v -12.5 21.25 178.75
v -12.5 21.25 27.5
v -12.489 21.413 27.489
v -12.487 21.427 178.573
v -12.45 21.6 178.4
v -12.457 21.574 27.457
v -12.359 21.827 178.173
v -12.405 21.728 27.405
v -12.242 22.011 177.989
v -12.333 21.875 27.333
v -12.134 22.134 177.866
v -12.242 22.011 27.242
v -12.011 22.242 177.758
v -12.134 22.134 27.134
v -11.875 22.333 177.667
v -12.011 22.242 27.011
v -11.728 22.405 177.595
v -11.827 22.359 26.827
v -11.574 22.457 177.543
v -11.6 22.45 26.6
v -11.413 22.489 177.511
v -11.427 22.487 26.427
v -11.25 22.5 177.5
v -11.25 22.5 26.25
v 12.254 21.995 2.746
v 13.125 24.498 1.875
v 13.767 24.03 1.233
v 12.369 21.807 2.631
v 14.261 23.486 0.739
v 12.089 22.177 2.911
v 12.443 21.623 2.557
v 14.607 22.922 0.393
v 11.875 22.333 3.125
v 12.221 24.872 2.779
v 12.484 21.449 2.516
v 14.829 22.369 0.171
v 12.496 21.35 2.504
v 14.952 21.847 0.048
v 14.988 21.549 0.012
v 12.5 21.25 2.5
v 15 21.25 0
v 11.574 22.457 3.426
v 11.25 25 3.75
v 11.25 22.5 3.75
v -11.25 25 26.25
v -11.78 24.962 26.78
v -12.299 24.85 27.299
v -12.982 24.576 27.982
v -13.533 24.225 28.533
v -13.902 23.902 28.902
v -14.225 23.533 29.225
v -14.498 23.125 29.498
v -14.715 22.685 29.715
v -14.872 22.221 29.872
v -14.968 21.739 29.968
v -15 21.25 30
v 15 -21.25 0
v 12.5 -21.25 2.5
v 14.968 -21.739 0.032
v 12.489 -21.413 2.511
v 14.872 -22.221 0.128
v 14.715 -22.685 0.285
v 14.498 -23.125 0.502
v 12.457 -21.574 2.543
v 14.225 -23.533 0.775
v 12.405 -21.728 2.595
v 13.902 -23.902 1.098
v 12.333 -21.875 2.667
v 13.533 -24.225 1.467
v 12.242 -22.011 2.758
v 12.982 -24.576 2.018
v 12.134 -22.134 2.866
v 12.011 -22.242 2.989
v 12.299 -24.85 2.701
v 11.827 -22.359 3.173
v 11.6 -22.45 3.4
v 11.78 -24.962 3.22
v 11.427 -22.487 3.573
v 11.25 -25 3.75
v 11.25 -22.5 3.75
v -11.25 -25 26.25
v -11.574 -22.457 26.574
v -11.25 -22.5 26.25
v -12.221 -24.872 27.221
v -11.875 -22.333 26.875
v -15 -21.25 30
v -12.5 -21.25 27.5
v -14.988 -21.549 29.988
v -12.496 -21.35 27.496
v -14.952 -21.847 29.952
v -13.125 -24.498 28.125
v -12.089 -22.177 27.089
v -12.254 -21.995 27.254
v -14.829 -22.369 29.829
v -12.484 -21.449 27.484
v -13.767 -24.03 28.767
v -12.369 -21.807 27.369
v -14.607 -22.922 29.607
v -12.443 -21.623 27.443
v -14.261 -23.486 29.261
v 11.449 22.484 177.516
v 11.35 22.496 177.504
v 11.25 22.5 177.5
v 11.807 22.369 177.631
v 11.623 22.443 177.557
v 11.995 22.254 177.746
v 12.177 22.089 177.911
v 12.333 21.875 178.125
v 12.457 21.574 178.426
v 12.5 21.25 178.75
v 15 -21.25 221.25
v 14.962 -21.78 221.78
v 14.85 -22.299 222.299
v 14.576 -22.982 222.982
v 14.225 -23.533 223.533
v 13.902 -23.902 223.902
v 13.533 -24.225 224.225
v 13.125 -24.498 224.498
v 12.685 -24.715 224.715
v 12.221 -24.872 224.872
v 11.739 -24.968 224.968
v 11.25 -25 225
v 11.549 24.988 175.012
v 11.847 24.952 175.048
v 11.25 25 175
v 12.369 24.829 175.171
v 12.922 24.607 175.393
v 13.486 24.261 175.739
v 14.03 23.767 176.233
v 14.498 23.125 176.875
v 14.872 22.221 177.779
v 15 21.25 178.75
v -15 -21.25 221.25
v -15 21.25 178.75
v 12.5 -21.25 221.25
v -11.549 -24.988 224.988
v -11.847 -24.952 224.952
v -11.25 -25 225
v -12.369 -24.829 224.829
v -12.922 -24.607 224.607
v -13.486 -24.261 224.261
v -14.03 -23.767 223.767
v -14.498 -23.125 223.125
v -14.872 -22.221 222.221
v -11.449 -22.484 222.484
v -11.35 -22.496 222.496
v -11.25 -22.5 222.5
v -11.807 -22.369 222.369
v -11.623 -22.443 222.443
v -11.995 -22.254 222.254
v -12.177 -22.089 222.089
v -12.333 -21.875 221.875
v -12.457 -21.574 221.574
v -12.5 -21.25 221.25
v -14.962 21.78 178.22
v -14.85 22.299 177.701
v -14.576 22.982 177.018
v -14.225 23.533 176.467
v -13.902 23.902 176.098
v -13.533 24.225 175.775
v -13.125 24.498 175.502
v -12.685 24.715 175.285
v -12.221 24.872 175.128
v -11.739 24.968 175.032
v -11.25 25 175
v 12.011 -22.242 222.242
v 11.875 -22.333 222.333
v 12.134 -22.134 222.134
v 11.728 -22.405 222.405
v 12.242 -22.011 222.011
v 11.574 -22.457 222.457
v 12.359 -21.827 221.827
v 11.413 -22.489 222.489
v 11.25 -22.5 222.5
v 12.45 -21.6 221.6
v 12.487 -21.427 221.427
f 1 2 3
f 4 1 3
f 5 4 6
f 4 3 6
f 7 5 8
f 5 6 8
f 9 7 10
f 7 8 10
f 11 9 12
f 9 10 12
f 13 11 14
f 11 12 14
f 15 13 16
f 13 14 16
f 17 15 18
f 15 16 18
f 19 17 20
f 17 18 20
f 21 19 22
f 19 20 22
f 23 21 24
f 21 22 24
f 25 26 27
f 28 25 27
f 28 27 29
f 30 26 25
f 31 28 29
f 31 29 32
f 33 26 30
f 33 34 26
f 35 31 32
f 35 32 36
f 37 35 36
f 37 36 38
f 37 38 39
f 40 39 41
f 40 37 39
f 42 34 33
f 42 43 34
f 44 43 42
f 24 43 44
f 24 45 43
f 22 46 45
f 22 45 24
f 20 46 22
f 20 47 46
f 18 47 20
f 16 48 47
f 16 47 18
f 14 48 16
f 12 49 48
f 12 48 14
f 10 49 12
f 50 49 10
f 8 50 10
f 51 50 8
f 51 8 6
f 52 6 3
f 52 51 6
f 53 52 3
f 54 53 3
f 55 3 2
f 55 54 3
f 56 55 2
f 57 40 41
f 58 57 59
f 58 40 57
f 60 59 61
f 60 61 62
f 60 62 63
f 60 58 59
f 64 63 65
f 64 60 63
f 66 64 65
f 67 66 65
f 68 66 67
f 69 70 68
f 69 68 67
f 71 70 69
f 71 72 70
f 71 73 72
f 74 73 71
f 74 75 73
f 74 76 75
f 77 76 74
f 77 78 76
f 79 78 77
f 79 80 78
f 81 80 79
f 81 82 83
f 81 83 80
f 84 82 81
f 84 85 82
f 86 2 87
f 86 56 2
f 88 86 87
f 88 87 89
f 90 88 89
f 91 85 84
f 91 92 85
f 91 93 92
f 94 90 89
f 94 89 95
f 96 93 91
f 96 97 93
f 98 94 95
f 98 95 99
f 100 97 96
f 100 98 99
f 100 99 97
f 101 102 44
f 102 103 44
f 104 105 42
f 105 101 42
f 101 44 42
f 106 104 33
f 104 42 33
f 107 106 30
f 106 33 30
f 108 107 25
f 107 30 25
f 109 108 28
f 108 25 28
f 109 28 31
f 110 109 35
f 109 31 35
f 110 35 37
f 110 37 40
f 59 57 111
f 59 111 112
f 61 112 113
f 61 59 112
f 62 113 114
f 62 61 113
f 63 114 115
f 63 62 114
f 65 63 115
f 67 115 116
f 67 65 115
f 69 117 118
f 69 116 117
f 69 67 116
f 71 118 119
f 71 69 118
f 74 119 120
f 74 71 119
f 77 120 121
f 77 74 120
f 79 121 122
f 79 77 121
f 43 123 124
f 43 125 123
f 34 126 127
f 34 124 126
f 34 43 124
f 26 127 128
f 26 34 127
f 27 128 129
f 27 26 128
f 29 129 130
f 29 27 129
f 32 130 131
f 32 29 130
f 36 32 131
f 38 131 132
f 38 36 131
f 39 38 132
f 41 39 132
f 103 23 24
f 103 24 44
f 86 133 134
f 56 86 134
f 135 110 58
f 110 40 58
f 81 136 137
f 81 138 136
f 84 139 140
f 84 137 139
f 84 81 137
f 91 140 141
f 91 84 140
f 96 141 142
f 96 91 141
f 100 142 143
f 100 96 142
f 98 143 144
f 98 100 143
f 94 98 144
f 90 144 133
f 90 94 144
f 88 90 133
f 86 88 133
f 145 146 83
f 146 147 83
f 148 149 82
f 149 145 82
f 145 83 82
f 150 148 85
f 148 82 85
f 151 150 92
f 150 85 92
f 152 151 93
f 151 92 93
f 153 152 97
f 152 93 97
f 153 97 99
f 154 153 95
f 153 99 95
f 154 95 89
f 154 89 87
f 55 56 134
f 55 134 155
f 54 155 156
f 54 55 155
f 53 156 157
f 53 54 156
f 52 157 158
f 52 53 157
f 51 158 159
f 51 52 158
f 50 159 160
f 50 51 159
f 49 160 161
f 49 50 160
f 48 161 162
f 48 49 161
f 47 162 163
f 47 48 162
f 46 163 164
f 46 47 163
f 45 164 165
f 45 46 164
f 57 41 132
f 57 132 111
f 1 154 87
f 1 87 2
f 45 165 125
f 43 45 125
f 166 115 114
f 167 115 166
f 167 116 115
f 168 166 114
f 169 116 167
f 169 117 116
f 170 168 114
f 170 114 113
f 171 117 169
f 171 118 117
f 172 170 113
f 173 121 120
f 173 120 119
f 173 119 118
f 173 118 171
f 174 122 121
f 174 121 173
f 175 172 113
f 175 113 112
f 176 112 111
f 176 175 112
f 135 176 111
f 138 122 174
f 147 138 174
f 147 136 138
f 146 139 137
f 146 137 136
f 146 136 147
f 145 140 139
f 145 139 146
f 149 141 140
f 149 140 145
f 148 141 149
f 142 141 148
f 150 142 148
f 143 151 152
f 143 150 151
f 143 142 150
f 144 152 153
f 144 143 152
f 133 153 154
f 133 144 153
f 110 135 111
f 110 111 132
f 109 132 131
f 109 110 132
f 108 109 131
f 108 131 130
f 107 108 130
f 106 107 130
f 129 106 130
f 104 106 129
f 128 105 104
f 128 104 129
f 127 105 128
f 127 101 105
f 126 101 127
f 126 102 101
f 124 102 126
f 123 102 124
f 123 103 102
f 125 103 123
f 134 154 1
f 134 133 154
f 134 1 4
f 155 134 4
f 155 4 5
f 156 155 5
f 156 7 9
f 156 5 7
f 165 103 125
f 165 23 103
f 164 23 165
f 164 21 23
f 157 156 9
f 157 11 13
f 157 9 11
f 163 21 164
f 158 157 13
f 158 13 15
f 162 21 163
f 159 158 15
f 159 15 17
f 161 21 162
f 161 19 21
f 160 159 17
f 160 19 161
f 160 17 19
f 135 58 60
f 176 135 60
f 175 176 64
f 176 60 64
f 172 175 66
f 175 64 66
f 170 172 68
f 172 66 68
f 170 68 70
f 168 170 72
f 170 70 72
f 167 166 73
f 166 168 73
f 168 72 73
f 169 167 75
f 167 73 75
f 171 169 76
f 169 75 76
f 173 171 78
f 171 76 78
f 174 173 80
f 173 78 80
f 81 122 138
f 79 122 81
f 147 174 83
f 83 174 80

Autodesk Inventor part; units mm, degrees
ref_plane "Plano inicial" through (0, 0, 0) normal (0, 0, 1) x (1, 0, 0)
ref_plane "Plano final" through (0, 0, 225) normal (0, 0, 1) x (1, 0, 0)
sketch "Esboço" plane through (0, 0, 0) normal (0, 0, 1) x (1, 0, 0)
  line L0 (-15, -21.25) -> (-15, 21.25)
  line L1 (-11.25, 25) -> (11.25, 25)
  line L2 (15, 21.25) -> (15, -21.25)
  line L3 (11.25, -25) -> (-11.25, -25)
  arc A0 (-15, -21.25) -> (-11.25, -25) centre (-11.25, -21.25) ccw
  arc A1 (-11.25, 25) -> (-15, 21.25) centre (-11.25, 21.25) ccw
  arc A2 (15, 21.25) -> (11.25, 25) centre (11.25, 21.25) ccw
  arc A3 (11.25, -25) -> (15, -21.25) centre (11.25, -21.25) ccw
  arc A4 (-11.25, 22.5) -> (-12.5, 21.25) centre (-11.25, 21.25) ccw
  line L4 (-11.25, 22.5) -> (11.25, 22.5)
  arc A5 (12.5, 21.25) -> (11.25, 22.5) centre (11.25, 21.25) ccw
  line L5 (12.5, 21.25) -> (12.5, -21.25)
  arc A6 (11.25, -22.5) -> (12.5, -21.25) centre (11.25, -21.25) ccw
  line L6 (11.25, -22.5) -> (-11.25, -22.5)
  arc A7 (-12.5, -21.25) -> (-11.25, -22.5) centre (-11.25, -21.25) ccw
  line L7 (-12.5, -21.25) -> (-12.5, 21.25)
  line L8 (0, 36.0873) -> (0, -36.0873) construction
  line L9 (-22.0873, 0) -> (22.0873, 0) construction
  dimension "d7" = 3.75
  dimension "d10" = 50
  dimension "d11" = 30
  dimension "d12" = 2.5
  dimension "d15" = 25
  dimension "d16" = 15
extrude "Corpo" add sketch "Esboço" along normal up to surface (225 mm away) from surface at 0
sketch "Sketch3" plane through (0, 0, 0) normal (0, 0, 1) x (1, 0, 0)
  line L0 (0, 0) -> (10, 0)
ref_plane "Work Plane3" through (0, 0, 0) normal (0, -1, 0) x (1, 0, 0)
sketch "Sketch4" plane through (0, 0, 0) normal (0, -1, 0) x (1, 0, 0)
  line L0 (-2, 0) -> (12, 0)
  line L1 (-2, 225) -> (12, 225)
  dimension "d18" = 225
ref_plane "Plano de trabalho7" through (0, -25, 225) normal (0, 0.7071, 0.7071) x (1, 0, 0)
split "Dividir4" plane through (0, -25, 225) removes the side toward (0, 0.7071, 0.7071)
ref_plane "Plano de trabalho9" through (15, 0, 0) normal (-0.7071, 0, -0.7071) x (-0.7071, 0, 0.7071)
split "Dividir6" plane through (15, 0, 0) removes the side toward (-0.7071, 0, -0.7071)
equation "\"d7\" = G_IR"
equation "\"d10\" = G_H"
equation "\"d11\" = G_W"
equation "\"d12\" = G_T"
equation "\"d15\" = 0.5 * d10"
equation "\"d16\" = 0.5 * d11"
equation "\"d3\" = G_L"
equation "\"G_W\" = 30"
equation "\"G_H\" = 50"
equation "\"G_T\" = 2.5"
equation "\"G_IR\" = 3.75"
equation "\"G_L\" = d18"
equation "\"G_OFFSET_START\" = 0"
equation "\"d14\" = G_OFFSET_END + B_L"
equation "\"B_L\" = 175"
equation "\"G_OFFSET_END\" = 50"
properties part number "ISO 12633-2 - 50x30x2.5 - 225" material "Aço, suave"
